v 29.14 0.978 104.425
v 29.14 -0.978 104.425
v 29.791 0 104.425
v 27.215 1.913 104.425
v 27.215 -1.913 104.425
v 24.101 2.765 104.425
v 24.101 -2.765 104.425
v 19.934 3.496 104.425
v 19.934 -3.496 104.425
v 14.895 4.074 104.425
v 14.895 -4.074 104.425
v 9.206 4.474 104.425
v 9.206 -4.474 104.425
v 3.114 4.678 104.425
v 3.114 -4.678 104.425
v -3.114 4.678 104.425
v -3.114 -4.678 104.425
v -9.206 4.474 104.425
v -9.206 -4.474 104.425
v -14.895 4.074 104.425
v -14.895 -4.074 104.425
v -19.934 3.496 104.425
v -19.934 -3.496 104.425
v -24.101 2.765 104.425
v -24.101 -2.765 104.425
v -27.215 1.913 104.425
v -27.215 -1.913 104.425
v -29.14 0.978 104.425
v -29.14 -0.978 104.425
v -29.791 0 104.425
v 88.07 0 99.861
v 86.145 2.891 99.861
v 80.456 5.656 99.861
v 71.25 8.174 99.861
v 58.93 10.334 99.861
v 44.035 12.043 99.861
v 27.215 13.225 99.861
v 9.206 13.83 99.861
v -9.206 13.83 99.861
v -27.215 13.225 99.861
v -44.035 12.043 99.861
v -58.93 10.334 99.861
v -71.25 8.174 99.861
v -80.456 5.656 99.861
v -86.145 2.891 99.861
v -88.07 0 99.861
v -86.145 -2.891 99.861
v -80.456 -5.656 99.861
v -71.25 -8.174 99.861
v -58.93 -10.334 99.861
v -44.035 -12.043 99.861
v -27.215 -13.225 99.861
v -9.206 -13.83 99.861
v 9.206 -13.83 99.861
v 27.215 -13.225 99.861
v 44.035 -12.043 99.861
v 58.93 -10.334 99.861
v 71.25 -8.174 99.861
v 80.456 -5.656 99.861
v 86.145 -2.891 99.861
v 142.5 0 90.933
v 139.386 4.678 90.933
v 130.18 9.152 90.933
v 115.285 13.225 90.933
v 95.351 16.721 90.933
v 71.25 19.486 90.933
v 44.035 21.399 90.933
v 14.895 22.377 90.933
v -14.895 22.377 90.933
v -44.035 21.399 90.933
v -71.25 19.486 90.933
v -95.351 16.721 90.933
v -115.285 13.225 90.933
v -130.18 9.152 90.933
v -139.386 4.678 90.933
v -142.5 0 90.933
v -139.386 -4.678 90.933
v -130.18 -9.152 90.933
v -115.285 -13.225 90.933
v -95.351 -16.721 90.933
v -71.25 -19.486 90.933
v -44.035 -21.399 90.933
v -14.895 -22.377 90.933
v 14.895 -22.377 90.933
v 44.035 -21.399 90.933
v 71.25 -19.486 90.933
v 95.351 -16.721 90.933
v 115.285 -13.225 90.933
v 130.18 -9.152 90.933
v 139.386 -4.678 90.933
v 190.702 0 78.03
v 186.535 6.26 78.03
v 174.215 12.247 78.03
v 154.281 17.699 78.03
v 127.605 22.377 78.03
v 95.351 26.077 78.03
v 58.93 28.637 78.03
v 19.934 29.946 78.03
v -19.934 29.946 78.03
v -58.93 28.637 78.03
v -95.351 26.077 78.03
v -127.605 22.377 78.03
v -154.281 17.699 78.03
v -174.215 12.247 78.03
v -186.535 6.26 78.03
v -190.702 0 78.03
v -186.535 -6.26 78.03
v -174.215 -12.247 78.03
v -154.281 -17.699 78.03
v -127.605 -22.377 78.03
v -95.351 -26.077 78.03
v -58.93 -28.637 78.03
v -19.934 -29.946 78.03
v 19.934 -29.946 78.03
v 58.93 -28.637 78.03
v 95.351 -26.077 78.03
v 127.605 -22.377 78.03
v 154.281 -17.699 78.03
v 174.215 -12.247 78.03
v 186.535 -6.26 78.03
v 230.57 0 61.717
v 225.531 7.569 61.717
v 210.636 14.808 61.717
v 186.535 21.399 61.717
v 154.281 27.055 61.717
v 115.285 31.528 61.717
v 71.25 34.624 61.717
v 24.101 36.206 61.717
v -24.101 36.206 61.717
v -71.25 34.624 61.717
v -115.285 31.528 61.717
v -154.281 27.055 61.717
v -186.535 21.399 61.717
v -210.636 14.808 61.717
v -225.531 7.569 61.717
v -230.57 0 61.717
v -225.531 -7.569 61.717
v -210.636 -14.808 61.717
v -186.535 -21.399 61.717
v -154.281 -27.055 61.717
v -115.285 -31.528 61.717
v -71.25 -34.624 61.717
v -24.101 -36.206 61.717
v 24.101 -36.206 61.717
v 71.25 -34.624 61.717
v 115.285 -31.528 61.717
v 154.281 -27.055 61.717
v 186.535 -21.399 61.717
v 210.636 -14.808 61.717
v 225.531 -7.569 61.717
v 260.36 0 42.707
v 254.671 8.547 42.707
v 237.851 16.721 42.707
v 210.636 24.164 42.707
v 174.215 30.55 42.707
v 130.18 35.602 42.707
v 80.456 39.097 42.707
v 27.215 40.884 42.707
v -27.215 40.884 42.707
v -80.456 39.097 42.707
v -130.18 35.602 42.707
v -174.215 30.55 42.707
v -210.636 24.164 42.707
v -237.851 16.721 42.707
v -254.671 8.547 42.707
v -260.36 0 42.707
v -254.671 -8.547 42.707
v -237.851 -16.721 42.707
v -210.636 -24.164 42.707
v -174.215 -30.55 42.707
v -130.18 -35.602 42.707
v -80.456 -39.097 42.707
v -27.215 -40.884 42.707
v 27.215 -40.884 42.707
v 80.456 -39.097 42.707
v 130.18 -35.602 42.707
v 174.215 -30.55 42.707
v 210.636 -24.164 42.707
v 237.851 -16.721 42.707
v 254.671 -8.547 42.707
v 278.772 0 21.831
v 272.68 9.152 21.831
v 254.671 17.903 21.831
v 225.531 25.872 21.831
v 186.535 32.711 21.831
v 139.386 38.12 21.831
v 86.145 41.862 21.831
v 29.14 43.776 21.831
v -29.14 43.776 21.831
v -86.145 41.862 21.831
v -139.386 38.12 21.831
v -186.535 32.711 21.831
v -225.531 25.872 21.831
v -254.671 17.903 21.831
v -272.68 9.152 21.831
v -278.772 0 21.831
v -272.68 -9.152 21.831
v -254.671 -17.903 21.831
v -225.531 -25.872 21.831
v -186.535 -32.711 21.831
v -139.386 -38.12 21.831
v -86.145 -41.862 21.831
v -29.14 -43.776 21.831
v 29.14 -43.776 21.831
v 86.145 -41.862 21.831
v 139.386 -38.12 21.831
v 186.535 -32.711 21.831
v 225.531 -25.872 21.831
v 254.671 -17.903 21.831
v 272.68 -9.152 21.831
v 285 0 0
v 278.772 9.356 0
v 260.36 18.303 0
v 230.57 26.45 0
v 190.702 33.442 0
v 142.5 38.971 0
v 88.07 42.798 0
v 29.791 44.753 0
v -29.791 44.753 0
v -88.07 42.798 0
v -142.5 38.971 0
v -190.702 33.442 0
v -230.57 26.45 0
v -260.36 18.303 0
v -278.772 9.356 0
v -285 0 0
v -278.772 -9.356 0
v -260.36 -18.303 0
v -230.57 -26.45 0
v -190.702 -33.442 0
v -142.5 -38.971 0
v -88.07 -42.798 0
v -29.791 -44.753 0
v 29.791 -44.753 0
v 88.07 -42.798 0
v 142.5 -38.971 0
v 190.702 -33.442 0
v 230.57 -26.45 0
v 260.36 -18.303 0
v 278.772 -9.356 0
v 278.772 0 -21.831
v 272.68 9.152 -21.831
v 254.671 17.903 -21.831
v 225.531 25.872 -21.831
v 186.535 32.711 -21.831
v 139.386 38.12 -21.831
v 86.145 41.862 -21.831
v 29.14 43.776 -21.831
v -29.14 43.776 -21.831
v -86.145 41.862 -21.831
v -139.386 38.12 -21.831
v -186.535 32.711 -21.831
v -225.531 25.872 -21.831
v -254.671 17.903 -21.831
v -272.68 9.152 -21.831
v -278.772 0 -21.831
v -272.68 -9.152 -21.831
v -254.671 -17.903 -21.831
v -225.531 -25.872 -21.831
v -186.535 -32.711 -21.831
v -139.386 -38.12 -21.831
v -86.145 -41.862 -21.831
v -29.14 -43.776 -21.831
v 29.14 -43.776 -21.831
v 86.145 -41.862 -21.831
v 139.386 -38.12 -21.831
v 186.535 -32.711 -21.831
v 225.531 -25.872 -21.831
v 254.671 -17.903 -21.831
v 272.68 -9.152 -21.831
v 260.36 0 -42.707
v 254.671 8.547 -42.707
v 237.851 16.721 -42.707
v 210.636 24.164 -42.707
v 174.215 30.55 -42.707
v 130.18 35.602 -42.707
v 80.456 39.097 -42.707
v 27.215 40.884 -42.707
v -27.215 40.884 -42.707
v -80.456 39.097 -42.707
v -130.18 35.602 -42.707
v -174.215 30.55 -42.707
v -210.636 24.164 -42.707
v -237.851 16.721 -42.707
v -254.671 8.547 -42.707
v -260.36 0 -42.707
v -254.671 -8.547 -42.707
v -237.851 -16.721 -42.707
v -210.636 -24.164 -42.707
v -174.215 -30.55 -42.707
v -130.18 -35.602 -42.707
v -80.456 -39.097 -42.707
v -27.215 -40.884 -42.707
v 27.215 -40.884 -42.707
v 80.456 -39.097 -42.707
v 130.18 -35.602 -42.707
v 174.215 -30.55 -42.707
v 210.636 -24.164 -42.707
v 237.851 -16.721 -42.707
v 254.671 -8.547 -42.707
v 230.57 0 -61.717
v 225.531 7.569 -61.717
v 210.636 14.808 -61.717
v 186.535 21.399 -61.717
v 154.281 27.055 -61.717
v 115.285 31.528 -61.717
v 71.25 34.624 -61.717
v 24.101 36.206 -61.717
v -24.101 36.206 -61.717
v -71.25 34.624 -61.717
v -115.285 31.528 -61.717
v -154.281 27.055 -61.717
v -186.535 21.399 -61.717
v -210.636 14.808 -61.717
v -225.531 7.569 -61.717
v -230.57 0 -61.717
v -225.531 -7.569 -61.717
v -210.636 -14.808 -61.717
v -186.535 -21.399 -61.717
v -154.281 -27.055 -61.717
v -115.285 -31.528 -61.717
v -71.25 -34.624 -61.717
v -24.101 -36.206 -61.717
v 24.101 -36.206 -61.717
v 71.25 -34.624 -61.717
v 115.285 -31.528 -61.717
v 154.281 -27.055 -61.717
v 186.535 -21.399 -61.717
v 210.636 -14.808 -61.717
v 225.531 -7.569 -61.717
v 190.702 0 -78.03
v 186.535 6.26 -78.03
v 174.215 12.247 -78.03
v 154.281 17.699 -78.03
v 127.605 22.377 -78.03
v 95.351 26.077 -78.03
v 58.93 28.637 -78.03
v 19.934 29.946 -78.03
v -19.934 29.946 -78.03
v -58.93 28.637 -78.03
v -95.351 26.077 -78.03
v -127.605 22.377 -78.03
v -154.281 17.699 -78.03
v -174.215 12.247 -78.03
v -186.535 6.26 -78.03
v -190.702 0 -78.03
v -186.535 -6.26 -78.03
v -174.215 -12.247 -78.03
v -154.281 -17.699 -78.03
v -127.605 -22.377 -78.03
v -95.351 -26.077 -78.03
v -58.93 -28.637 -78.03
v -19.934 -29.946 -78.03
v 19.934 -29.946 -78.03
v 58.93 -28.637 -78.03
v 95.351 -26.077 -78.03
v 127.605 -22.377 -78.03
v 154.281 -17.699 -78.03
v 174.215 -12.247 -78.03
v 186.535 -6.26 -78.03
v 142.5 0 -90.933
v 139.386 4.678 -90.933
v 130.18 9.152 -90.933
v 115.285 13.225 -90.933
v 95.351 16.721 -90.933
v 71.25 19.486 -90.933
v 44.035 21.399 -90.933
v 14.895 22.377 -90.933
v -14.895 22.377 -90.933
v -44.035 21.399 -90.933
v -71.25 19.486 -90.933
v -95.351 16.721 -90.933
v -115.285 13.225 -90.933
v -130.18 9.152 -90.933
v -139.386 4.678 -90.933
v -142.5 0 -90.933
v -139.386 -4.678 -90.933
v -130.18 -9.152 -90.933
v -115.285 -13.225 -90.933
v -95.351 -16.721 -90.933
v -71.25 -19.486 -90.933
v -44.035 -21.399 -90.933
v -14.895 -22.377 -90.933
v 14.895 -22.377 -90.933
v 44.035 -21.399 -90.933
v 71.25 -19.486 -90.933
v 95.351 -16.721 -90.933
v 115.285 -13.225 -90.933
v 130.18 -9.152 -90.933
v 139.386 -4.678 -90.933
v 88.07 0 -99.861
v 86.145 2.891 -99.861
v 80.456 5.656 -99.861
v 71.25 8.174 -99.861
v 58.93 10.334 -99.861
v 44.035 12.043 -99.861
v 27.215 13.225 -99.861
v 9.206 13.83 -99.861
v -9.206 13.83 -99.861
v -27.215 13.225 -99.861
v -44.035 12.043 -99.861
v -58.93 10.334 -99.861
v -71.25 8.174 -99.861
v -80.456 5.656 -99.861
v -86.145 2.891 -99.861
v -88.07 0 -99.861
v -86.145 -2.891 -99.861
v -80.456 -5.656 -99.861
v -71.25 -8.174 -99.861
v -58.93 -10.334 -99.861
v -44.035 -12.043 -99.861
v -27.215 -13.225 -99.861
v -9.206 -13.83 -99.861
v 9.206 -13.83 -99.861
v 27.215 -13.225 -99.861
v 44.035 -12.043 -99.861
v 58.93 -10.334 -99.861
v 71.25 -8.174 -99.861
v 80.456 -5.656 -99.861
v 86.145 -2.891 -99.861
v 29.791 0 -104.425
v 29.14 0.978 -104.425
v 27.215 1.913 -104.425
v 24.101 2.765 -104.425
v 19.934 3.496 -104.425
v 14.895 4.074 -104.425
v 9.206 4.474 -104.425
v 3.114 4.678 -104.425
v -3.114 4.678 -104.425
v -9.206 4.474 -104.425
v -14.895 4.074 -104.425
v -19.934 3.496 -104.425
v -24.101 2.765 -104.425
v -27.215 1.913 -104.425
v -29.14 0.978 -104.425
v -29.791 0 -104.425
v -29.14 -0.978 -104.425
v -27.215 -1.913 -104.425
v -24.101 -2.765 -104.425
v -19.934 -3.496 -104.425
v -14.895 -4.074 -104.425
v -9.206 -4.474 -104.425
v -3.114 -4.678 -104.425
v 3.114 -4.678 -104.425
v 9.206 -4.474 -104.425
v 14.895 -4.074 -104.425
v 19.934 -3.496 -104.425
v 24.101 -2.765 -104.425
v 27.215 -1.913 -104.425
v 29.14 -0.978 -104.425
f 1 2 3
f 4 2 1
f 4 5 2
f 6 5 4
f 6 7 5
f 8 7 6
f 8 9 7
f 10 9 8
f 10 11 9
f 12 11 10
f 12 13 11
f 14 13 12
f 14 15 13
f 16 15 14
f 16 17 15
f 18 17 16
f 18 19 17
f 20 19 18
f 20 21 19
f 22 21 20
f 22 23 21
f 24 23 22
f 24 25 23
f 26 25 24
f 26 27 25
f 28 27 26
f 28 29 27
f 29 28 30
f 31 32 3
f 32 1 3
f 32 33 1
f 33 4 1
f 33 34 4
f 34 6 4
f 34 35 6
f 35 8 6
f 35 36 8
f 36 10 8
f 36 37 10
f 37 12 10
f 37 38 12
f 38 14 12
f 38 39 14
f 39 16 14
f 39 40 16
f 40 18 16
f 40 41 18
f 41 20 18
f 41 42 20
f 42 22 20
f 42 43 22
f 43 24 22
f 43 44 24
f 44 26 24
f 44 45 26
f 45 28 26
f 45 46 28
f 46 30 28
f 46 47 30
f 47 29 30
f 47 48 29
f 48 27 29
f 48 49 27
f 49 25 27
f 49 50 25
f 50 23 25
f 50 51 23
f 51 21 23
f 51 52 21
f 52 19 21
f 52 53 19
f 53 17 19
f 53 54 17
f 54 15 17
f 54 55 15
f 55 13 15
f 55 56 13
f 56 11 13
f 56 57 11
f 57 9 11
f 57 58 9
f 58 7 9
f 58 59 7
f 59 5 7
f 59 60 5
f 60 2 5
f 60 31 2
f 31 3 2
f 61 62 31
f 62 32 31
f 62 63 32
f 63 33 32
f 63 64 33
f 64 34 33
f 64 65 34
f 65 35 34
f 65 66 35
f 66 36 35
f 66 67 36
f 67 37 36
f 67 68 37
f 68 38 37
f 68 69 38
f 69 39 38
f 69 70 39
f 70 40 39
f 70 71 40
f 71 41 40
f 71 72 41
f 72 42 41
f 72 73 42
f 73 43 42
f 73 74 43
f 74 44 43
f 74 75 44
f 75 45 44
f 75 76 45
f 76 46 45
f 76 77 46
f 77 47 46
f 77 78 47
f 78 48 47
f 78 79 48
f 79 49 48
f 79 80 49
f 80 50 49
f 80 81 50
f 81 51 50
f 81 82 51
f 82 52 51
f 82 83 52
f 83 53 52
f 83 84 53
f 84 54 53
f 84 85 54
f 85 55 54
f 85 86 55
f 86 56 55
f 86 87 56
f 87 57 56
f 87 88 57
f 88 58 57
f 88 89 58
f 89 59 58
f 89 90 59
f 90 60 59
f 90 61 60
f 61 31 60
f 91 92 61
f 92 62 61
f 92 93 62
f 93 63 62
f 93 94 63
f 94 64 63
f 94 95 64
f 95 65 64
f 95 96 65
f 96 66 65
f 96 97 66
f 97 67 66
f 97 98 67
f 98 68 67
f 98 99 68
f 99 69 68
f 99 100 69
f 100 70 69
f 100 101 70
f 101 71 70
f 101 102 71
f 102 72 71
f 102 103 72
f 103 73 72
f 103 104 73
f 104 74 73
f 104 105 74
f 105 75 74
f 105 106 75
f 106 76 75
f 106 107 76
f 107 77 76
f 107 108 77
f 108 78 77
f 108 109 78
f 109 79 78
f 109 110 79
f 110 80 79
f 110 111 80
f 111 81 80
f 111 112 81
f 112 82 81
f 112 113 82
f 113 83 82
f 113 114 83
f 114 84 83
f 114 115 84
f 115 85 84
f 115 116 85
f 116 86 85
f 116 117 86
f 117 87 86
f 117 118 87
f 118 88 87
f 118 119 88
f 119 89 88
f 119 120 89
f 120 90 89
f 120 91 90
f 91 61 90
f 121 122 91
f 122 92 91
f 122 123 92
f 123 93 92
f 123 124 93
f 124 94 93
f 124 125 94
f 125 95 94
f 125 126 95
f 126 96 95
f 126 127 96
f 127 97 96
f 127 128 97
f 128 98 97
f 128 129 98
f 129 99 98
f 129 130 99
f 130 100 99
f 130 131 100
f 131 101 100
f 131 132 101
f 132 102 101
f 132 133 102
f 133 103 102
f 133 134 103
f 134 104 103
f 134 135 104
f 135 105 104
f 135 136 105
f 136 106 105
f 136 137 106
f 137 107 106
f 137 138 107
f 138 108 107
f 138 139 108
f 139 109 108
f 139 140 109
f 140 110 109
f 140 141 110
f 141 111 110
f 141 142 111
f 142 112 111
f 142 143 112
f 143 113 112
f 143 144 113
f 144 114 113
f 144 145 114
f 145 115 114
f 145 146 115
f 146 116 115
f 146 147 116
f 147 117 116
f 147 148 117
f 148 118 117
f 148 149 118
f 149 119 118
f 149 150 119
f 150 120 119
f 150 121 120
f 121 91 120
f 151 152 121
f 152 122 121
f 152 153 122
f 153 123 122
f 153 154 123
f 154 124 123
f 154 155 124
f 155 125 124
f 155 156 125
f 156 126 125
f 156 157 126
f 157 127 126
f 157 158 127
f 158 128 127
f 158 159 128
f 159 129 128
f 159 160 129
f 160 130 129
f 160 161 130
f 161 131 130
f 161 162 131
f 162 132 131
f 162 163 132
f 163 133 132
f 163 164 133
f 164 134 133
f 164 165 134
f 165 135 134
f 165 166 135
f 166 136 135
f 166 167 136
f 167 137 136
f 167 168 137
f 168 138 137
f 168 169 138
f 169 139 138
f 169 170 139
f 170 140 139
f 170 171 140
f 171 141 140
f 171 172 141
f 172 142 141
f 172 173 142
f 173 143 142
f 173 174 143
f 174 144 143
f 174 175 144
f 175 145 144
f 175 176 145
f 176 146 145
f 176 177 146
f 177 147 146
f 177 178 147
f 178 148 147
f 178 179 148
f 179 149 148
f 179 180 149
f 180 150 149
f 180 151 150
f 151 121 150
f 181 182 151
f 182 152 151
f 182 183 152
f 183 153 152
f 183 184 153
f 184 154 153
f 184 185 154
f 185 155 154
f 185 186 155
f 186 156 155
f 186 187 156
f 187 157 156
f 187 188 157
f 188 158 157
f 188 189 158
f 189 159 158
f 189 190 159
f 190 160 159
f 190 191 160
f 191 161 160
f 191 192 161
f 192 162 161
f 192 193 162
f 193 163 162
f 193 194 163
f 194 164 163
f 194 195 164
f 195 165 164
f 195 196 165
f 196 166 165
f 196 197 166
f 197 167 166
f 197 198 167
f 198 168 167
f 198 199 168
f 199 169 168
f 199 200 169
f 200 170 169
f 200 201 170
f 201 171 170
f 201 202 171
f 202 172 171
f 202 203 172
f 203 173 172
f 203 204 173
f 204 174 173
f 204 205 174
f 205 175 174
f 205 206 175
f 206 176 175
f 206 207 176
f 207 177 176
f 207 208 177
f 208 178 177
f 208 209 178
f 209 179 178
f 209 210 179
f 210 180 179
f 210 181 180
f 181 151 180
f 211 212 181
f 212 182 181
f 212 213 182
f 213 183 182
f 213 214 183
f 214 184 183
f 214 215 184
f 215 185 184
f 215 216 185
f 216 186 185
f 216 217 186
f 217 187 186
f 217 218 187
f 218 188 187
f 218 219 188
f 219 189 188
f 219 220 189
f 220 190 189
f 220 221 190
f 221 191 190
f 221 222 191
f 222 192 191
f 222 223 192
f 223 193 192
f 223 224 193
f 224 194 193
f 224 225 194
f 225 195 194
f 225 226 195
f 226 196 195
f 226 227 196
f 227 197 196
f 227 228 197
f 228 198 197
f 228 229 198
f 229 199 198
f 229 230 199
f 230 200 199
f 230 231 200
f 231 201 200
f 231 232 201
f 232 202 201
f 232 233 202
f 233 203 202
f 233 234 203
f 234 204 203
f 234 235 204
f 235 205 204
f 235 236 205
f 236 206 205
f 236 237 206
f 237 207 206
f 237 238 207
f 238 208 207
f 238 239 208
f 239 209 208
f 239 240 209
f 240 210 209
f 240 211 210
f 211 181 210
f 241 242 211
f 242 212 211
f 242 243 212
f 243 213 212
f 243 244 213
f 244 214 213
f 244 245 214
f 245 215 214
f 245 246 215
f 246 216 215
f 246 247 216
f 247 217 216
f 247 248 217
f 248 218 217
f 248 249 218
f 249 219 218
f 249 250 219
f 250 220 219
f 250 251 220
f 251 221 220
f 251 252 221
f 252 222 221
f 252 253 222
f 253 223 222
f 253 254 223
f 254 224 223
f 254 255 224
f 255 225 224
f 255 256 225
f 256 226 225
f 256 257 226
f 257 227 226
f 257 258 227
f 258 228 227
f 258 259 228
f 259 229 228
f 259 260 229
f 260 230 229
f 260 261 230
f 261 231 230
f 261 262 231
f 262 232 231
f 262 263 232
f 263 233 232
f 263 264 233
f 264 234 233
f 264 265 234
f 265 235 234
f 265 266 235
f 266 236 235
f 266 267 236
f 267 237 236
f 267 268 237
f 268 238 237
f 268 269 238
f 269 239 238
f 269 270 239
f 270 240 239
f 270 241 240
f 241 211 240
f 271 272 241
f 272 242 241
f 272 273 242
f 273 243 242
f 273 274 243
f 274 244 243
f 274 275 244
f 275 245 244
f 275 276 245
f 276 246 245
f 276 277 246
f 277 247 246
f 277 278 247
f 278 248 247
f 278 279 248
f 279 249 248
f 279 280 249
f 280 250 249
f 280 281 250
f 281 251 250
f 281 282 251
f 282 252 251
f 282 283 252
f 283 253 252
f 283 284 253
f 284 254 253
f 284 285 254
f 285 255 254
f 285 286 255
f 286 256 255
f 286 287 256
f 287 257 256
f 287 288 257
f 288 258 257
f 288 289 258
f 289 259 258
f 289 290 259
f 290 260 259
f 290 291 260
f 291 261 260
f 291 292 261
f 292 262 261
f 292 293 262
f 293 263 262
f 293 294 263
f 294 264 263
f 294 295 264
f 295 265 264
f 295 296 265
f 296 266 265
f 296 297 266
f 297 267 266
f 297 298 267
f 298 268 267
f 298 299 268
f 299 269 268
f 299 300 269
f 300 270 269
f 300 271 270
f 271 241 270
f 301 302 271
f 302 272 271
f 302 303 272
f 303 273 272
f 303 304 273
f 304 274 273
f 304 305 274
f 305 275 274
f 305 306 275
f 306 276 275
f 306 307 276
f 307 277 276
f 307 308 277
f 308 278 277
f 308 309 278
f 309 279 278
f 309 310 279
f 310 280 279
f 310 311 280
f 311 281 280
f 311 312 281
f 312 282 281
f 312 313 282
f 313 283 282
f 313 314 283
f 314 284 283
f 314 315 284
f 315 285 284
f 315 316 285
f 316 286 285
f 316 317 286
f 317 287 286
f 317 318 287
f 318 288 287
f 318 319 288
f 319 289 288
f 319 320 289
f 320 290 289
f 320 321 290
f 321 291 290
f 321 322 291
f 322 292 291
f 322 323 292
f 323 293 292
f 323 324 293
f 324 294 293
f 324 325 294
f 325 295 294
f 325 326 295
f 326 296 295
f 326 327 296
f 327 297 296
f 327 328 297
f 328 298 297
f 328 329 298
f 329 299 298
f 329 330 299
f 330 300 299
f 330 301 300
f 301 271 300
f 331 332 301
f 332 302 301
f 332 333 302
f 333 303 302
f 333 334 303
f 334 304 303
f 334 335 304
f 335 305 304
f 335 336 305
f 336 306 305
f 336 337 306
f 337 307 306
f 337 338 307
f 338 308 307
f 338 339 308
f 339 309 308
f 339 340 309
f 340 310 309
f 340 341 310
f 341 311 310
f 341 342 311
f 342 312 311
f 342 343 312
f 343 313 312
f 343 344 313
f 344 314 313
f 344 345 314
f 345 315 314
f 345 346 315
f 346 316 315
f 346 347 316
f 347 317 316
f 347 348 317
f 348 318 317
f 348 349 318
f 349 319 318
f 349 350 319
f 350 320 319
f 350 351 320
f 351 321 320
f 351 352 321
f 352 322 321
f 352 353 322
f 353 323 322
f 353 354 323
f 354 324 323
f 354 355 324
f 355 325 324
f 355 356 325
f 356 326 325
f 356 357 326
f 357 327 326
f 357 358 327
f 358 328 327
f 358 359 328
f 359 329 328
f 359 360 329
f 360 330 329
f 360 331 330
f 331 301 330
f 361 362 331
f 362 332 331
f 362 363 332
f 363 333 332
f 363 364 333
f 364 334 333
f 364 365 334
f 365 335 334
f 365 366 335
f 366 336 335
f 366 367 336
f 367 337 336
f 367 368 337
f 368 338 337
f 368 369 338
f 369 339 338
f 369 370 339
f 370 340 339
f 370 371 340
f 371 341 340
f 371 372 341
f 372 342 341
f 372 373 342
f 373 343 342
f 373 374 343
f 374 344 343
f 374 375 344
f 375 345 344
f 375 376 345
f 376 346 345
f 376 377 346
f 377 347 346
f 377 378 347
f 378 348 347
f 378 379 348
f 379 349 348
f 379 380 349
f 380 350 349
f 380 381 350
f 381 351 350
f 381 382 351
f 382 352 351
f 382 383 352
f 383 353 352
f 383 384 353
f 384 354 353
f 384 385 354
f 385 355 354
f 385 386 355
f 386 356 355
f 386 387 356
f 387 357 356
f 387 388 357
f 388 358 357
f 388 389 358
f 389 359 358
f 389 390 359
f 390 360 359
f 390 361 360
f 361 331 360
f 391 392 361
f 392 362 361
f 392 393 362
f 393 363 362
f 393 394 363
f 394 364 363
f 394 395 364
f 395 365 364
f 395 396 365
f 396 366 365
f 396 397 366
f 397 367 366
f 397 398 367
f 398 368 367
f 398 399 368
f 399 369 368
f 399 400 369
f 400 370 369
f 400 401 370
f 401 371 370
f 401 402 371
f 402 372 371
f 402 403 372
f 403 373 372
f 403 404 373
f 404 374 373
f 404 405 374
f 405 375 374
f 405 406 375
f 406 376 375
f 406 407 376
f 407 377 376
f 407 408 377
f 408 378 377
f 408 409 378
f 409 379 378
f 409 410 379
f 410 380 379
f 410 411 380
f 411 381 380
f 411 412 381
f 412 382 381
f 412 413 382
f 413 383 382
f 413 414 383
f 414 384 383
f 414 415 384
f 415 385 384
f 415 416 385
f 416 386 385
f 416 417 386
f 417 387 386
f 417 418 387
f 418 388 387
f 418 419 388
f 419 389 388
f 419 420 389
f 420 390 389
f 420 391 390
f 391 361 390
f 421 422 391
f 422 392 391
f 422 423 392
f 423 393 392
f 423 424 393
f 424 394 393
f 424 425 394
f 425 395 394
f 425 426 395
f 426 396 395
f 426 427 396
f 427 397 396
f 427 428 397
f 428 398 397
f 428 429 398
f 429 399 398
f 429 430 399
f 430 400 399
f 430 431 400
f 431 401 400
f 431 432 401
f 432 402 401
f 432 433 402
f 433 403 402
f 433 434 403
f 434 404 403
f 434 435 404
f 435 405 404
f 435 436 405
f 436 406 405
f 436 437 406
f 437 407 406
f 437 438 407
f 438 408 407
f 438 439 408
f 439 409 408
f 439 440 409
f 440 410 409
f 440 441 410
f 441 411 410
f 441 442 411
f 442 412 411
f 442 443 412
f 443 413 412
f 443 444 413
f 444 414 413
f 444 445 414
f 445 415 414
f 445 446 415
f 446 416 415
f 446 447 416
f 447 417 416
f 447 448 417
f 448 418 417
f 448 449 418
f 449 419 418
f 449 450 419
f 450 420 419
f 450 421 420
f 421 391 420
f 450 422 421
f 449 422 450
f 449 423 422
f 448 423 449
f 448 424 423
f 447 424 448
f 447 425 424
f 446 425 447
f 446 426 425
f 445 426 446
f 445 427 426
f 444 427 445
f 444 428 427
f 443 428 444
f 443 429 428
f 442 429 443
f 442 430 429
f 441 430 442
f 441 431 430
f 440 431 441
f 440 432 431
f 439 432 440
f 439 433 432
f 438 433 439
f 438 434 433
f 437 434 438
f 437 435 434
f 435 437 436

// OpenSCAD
// Generated by SolidPython 1.0.1 on 2020-07-29 00:46:53


scale(v = [19, 3, 7]) {
	sphere(r = 15);
}
/***********************************************
*********      SolidPython code:      **********
************************************************
 
# import packages: SolidPython
from solid import *
from solid.utils import *
from itertools import chain, combinations, permutations


class Resize:

    def __init__(self, scad_file):
        self.scad_file = scad_file
        #self.scad_file = import_scad(scad_file)
        # cone/cylinder param:
        self.r1 = 0
        self.r2 = 0
        self.h = 0
        # rectangular prism param:
        self.w = 0
        self.l = 0
        # ellipse param:
        self.r = 0

    # import OpenScad code (file name corresponds to shape)


    # classify shape + parameters
    def assign(self, param1, param2, param3):
        if self.scad_file == 'cone.scad':
            self.r1 = param1
            self.r2 = param2
            self.h = param3
        elif self.scad_file == 'cylinder.scad':
            self.r1 = param1
            self.r2 = param2
            self.h = param3
        elif self.scad_file == 'rectangularPrism.scad':
            self.h = param1
            self.l = param2
            self.w = param3
        else:
            self.r = param1
            self.h = param2

    # resize parameters
    def iterate(self):
        x = range(3, 20, 2)
        i = 1
        if self.scad_file == 'cone.scad':
            tempList = list(permutations(x, 2))
            for temp in tempList:
                param1 = temp[0]
                param2 = temp[1]
                filepath = 'produced_scad_files/' + 'cone' + str(param1) + '_' + str(param2) + '_' + '.scad'
                scad_render_to_file(cylinder(h=param1, r1=param2, r2=0), filepath)

        elif self.scad_file == 'cylinder.scad':
            tempList = list(permutations(x, 3))
            for temp in tempList:
                param1 = temp[0]
                param2 = temp[1]
                filepath = 'produced_scad_files/' + 'cylinder' + str(param1) + '_' + str(param2) + '_' + '.scad'
                scad_render_to_file(cylinder(h=param1, r1=param2, r2=param2), filepath)

        elif self.scad_file == 'rectangularPrism.scad':
            tempList = list(permutations(x, 3))
            for temp in tempList:
                param1 = temp[0]
                param2 = temp[1]
                param3 = temp[2]
                filepath = 'produced_scad_files/' + 'rectangularPrism' + str(param1) + '_' + str(param2) + '_' + str(
                    param3) + '.scad'
                scad_render_to_file(cube(size=(param1, param2, param3)), filepath)

        elif self.scad_file == 'ellipse.scad':
            tempList = list(permutations(x, 4))
            for temp in tempList:
                param1 = temp[0]
                param2 = temp[1]
                param3 = temp[2]
                param4 = temp[3]
                filepath = 'produced_scad_files/' + 'ellipse' + str(param1) + '_' + str(param2) + '_' + str(param3) + '_' + str(param4) + '.scad'
                scad_render_to_file(scale([param1, param2, param3])(sphere(r=param4)), filepath)

    def render_to_scadfile(self):
        scad_render_to_file(scad, 'example.scad') 
 
************************************************/
